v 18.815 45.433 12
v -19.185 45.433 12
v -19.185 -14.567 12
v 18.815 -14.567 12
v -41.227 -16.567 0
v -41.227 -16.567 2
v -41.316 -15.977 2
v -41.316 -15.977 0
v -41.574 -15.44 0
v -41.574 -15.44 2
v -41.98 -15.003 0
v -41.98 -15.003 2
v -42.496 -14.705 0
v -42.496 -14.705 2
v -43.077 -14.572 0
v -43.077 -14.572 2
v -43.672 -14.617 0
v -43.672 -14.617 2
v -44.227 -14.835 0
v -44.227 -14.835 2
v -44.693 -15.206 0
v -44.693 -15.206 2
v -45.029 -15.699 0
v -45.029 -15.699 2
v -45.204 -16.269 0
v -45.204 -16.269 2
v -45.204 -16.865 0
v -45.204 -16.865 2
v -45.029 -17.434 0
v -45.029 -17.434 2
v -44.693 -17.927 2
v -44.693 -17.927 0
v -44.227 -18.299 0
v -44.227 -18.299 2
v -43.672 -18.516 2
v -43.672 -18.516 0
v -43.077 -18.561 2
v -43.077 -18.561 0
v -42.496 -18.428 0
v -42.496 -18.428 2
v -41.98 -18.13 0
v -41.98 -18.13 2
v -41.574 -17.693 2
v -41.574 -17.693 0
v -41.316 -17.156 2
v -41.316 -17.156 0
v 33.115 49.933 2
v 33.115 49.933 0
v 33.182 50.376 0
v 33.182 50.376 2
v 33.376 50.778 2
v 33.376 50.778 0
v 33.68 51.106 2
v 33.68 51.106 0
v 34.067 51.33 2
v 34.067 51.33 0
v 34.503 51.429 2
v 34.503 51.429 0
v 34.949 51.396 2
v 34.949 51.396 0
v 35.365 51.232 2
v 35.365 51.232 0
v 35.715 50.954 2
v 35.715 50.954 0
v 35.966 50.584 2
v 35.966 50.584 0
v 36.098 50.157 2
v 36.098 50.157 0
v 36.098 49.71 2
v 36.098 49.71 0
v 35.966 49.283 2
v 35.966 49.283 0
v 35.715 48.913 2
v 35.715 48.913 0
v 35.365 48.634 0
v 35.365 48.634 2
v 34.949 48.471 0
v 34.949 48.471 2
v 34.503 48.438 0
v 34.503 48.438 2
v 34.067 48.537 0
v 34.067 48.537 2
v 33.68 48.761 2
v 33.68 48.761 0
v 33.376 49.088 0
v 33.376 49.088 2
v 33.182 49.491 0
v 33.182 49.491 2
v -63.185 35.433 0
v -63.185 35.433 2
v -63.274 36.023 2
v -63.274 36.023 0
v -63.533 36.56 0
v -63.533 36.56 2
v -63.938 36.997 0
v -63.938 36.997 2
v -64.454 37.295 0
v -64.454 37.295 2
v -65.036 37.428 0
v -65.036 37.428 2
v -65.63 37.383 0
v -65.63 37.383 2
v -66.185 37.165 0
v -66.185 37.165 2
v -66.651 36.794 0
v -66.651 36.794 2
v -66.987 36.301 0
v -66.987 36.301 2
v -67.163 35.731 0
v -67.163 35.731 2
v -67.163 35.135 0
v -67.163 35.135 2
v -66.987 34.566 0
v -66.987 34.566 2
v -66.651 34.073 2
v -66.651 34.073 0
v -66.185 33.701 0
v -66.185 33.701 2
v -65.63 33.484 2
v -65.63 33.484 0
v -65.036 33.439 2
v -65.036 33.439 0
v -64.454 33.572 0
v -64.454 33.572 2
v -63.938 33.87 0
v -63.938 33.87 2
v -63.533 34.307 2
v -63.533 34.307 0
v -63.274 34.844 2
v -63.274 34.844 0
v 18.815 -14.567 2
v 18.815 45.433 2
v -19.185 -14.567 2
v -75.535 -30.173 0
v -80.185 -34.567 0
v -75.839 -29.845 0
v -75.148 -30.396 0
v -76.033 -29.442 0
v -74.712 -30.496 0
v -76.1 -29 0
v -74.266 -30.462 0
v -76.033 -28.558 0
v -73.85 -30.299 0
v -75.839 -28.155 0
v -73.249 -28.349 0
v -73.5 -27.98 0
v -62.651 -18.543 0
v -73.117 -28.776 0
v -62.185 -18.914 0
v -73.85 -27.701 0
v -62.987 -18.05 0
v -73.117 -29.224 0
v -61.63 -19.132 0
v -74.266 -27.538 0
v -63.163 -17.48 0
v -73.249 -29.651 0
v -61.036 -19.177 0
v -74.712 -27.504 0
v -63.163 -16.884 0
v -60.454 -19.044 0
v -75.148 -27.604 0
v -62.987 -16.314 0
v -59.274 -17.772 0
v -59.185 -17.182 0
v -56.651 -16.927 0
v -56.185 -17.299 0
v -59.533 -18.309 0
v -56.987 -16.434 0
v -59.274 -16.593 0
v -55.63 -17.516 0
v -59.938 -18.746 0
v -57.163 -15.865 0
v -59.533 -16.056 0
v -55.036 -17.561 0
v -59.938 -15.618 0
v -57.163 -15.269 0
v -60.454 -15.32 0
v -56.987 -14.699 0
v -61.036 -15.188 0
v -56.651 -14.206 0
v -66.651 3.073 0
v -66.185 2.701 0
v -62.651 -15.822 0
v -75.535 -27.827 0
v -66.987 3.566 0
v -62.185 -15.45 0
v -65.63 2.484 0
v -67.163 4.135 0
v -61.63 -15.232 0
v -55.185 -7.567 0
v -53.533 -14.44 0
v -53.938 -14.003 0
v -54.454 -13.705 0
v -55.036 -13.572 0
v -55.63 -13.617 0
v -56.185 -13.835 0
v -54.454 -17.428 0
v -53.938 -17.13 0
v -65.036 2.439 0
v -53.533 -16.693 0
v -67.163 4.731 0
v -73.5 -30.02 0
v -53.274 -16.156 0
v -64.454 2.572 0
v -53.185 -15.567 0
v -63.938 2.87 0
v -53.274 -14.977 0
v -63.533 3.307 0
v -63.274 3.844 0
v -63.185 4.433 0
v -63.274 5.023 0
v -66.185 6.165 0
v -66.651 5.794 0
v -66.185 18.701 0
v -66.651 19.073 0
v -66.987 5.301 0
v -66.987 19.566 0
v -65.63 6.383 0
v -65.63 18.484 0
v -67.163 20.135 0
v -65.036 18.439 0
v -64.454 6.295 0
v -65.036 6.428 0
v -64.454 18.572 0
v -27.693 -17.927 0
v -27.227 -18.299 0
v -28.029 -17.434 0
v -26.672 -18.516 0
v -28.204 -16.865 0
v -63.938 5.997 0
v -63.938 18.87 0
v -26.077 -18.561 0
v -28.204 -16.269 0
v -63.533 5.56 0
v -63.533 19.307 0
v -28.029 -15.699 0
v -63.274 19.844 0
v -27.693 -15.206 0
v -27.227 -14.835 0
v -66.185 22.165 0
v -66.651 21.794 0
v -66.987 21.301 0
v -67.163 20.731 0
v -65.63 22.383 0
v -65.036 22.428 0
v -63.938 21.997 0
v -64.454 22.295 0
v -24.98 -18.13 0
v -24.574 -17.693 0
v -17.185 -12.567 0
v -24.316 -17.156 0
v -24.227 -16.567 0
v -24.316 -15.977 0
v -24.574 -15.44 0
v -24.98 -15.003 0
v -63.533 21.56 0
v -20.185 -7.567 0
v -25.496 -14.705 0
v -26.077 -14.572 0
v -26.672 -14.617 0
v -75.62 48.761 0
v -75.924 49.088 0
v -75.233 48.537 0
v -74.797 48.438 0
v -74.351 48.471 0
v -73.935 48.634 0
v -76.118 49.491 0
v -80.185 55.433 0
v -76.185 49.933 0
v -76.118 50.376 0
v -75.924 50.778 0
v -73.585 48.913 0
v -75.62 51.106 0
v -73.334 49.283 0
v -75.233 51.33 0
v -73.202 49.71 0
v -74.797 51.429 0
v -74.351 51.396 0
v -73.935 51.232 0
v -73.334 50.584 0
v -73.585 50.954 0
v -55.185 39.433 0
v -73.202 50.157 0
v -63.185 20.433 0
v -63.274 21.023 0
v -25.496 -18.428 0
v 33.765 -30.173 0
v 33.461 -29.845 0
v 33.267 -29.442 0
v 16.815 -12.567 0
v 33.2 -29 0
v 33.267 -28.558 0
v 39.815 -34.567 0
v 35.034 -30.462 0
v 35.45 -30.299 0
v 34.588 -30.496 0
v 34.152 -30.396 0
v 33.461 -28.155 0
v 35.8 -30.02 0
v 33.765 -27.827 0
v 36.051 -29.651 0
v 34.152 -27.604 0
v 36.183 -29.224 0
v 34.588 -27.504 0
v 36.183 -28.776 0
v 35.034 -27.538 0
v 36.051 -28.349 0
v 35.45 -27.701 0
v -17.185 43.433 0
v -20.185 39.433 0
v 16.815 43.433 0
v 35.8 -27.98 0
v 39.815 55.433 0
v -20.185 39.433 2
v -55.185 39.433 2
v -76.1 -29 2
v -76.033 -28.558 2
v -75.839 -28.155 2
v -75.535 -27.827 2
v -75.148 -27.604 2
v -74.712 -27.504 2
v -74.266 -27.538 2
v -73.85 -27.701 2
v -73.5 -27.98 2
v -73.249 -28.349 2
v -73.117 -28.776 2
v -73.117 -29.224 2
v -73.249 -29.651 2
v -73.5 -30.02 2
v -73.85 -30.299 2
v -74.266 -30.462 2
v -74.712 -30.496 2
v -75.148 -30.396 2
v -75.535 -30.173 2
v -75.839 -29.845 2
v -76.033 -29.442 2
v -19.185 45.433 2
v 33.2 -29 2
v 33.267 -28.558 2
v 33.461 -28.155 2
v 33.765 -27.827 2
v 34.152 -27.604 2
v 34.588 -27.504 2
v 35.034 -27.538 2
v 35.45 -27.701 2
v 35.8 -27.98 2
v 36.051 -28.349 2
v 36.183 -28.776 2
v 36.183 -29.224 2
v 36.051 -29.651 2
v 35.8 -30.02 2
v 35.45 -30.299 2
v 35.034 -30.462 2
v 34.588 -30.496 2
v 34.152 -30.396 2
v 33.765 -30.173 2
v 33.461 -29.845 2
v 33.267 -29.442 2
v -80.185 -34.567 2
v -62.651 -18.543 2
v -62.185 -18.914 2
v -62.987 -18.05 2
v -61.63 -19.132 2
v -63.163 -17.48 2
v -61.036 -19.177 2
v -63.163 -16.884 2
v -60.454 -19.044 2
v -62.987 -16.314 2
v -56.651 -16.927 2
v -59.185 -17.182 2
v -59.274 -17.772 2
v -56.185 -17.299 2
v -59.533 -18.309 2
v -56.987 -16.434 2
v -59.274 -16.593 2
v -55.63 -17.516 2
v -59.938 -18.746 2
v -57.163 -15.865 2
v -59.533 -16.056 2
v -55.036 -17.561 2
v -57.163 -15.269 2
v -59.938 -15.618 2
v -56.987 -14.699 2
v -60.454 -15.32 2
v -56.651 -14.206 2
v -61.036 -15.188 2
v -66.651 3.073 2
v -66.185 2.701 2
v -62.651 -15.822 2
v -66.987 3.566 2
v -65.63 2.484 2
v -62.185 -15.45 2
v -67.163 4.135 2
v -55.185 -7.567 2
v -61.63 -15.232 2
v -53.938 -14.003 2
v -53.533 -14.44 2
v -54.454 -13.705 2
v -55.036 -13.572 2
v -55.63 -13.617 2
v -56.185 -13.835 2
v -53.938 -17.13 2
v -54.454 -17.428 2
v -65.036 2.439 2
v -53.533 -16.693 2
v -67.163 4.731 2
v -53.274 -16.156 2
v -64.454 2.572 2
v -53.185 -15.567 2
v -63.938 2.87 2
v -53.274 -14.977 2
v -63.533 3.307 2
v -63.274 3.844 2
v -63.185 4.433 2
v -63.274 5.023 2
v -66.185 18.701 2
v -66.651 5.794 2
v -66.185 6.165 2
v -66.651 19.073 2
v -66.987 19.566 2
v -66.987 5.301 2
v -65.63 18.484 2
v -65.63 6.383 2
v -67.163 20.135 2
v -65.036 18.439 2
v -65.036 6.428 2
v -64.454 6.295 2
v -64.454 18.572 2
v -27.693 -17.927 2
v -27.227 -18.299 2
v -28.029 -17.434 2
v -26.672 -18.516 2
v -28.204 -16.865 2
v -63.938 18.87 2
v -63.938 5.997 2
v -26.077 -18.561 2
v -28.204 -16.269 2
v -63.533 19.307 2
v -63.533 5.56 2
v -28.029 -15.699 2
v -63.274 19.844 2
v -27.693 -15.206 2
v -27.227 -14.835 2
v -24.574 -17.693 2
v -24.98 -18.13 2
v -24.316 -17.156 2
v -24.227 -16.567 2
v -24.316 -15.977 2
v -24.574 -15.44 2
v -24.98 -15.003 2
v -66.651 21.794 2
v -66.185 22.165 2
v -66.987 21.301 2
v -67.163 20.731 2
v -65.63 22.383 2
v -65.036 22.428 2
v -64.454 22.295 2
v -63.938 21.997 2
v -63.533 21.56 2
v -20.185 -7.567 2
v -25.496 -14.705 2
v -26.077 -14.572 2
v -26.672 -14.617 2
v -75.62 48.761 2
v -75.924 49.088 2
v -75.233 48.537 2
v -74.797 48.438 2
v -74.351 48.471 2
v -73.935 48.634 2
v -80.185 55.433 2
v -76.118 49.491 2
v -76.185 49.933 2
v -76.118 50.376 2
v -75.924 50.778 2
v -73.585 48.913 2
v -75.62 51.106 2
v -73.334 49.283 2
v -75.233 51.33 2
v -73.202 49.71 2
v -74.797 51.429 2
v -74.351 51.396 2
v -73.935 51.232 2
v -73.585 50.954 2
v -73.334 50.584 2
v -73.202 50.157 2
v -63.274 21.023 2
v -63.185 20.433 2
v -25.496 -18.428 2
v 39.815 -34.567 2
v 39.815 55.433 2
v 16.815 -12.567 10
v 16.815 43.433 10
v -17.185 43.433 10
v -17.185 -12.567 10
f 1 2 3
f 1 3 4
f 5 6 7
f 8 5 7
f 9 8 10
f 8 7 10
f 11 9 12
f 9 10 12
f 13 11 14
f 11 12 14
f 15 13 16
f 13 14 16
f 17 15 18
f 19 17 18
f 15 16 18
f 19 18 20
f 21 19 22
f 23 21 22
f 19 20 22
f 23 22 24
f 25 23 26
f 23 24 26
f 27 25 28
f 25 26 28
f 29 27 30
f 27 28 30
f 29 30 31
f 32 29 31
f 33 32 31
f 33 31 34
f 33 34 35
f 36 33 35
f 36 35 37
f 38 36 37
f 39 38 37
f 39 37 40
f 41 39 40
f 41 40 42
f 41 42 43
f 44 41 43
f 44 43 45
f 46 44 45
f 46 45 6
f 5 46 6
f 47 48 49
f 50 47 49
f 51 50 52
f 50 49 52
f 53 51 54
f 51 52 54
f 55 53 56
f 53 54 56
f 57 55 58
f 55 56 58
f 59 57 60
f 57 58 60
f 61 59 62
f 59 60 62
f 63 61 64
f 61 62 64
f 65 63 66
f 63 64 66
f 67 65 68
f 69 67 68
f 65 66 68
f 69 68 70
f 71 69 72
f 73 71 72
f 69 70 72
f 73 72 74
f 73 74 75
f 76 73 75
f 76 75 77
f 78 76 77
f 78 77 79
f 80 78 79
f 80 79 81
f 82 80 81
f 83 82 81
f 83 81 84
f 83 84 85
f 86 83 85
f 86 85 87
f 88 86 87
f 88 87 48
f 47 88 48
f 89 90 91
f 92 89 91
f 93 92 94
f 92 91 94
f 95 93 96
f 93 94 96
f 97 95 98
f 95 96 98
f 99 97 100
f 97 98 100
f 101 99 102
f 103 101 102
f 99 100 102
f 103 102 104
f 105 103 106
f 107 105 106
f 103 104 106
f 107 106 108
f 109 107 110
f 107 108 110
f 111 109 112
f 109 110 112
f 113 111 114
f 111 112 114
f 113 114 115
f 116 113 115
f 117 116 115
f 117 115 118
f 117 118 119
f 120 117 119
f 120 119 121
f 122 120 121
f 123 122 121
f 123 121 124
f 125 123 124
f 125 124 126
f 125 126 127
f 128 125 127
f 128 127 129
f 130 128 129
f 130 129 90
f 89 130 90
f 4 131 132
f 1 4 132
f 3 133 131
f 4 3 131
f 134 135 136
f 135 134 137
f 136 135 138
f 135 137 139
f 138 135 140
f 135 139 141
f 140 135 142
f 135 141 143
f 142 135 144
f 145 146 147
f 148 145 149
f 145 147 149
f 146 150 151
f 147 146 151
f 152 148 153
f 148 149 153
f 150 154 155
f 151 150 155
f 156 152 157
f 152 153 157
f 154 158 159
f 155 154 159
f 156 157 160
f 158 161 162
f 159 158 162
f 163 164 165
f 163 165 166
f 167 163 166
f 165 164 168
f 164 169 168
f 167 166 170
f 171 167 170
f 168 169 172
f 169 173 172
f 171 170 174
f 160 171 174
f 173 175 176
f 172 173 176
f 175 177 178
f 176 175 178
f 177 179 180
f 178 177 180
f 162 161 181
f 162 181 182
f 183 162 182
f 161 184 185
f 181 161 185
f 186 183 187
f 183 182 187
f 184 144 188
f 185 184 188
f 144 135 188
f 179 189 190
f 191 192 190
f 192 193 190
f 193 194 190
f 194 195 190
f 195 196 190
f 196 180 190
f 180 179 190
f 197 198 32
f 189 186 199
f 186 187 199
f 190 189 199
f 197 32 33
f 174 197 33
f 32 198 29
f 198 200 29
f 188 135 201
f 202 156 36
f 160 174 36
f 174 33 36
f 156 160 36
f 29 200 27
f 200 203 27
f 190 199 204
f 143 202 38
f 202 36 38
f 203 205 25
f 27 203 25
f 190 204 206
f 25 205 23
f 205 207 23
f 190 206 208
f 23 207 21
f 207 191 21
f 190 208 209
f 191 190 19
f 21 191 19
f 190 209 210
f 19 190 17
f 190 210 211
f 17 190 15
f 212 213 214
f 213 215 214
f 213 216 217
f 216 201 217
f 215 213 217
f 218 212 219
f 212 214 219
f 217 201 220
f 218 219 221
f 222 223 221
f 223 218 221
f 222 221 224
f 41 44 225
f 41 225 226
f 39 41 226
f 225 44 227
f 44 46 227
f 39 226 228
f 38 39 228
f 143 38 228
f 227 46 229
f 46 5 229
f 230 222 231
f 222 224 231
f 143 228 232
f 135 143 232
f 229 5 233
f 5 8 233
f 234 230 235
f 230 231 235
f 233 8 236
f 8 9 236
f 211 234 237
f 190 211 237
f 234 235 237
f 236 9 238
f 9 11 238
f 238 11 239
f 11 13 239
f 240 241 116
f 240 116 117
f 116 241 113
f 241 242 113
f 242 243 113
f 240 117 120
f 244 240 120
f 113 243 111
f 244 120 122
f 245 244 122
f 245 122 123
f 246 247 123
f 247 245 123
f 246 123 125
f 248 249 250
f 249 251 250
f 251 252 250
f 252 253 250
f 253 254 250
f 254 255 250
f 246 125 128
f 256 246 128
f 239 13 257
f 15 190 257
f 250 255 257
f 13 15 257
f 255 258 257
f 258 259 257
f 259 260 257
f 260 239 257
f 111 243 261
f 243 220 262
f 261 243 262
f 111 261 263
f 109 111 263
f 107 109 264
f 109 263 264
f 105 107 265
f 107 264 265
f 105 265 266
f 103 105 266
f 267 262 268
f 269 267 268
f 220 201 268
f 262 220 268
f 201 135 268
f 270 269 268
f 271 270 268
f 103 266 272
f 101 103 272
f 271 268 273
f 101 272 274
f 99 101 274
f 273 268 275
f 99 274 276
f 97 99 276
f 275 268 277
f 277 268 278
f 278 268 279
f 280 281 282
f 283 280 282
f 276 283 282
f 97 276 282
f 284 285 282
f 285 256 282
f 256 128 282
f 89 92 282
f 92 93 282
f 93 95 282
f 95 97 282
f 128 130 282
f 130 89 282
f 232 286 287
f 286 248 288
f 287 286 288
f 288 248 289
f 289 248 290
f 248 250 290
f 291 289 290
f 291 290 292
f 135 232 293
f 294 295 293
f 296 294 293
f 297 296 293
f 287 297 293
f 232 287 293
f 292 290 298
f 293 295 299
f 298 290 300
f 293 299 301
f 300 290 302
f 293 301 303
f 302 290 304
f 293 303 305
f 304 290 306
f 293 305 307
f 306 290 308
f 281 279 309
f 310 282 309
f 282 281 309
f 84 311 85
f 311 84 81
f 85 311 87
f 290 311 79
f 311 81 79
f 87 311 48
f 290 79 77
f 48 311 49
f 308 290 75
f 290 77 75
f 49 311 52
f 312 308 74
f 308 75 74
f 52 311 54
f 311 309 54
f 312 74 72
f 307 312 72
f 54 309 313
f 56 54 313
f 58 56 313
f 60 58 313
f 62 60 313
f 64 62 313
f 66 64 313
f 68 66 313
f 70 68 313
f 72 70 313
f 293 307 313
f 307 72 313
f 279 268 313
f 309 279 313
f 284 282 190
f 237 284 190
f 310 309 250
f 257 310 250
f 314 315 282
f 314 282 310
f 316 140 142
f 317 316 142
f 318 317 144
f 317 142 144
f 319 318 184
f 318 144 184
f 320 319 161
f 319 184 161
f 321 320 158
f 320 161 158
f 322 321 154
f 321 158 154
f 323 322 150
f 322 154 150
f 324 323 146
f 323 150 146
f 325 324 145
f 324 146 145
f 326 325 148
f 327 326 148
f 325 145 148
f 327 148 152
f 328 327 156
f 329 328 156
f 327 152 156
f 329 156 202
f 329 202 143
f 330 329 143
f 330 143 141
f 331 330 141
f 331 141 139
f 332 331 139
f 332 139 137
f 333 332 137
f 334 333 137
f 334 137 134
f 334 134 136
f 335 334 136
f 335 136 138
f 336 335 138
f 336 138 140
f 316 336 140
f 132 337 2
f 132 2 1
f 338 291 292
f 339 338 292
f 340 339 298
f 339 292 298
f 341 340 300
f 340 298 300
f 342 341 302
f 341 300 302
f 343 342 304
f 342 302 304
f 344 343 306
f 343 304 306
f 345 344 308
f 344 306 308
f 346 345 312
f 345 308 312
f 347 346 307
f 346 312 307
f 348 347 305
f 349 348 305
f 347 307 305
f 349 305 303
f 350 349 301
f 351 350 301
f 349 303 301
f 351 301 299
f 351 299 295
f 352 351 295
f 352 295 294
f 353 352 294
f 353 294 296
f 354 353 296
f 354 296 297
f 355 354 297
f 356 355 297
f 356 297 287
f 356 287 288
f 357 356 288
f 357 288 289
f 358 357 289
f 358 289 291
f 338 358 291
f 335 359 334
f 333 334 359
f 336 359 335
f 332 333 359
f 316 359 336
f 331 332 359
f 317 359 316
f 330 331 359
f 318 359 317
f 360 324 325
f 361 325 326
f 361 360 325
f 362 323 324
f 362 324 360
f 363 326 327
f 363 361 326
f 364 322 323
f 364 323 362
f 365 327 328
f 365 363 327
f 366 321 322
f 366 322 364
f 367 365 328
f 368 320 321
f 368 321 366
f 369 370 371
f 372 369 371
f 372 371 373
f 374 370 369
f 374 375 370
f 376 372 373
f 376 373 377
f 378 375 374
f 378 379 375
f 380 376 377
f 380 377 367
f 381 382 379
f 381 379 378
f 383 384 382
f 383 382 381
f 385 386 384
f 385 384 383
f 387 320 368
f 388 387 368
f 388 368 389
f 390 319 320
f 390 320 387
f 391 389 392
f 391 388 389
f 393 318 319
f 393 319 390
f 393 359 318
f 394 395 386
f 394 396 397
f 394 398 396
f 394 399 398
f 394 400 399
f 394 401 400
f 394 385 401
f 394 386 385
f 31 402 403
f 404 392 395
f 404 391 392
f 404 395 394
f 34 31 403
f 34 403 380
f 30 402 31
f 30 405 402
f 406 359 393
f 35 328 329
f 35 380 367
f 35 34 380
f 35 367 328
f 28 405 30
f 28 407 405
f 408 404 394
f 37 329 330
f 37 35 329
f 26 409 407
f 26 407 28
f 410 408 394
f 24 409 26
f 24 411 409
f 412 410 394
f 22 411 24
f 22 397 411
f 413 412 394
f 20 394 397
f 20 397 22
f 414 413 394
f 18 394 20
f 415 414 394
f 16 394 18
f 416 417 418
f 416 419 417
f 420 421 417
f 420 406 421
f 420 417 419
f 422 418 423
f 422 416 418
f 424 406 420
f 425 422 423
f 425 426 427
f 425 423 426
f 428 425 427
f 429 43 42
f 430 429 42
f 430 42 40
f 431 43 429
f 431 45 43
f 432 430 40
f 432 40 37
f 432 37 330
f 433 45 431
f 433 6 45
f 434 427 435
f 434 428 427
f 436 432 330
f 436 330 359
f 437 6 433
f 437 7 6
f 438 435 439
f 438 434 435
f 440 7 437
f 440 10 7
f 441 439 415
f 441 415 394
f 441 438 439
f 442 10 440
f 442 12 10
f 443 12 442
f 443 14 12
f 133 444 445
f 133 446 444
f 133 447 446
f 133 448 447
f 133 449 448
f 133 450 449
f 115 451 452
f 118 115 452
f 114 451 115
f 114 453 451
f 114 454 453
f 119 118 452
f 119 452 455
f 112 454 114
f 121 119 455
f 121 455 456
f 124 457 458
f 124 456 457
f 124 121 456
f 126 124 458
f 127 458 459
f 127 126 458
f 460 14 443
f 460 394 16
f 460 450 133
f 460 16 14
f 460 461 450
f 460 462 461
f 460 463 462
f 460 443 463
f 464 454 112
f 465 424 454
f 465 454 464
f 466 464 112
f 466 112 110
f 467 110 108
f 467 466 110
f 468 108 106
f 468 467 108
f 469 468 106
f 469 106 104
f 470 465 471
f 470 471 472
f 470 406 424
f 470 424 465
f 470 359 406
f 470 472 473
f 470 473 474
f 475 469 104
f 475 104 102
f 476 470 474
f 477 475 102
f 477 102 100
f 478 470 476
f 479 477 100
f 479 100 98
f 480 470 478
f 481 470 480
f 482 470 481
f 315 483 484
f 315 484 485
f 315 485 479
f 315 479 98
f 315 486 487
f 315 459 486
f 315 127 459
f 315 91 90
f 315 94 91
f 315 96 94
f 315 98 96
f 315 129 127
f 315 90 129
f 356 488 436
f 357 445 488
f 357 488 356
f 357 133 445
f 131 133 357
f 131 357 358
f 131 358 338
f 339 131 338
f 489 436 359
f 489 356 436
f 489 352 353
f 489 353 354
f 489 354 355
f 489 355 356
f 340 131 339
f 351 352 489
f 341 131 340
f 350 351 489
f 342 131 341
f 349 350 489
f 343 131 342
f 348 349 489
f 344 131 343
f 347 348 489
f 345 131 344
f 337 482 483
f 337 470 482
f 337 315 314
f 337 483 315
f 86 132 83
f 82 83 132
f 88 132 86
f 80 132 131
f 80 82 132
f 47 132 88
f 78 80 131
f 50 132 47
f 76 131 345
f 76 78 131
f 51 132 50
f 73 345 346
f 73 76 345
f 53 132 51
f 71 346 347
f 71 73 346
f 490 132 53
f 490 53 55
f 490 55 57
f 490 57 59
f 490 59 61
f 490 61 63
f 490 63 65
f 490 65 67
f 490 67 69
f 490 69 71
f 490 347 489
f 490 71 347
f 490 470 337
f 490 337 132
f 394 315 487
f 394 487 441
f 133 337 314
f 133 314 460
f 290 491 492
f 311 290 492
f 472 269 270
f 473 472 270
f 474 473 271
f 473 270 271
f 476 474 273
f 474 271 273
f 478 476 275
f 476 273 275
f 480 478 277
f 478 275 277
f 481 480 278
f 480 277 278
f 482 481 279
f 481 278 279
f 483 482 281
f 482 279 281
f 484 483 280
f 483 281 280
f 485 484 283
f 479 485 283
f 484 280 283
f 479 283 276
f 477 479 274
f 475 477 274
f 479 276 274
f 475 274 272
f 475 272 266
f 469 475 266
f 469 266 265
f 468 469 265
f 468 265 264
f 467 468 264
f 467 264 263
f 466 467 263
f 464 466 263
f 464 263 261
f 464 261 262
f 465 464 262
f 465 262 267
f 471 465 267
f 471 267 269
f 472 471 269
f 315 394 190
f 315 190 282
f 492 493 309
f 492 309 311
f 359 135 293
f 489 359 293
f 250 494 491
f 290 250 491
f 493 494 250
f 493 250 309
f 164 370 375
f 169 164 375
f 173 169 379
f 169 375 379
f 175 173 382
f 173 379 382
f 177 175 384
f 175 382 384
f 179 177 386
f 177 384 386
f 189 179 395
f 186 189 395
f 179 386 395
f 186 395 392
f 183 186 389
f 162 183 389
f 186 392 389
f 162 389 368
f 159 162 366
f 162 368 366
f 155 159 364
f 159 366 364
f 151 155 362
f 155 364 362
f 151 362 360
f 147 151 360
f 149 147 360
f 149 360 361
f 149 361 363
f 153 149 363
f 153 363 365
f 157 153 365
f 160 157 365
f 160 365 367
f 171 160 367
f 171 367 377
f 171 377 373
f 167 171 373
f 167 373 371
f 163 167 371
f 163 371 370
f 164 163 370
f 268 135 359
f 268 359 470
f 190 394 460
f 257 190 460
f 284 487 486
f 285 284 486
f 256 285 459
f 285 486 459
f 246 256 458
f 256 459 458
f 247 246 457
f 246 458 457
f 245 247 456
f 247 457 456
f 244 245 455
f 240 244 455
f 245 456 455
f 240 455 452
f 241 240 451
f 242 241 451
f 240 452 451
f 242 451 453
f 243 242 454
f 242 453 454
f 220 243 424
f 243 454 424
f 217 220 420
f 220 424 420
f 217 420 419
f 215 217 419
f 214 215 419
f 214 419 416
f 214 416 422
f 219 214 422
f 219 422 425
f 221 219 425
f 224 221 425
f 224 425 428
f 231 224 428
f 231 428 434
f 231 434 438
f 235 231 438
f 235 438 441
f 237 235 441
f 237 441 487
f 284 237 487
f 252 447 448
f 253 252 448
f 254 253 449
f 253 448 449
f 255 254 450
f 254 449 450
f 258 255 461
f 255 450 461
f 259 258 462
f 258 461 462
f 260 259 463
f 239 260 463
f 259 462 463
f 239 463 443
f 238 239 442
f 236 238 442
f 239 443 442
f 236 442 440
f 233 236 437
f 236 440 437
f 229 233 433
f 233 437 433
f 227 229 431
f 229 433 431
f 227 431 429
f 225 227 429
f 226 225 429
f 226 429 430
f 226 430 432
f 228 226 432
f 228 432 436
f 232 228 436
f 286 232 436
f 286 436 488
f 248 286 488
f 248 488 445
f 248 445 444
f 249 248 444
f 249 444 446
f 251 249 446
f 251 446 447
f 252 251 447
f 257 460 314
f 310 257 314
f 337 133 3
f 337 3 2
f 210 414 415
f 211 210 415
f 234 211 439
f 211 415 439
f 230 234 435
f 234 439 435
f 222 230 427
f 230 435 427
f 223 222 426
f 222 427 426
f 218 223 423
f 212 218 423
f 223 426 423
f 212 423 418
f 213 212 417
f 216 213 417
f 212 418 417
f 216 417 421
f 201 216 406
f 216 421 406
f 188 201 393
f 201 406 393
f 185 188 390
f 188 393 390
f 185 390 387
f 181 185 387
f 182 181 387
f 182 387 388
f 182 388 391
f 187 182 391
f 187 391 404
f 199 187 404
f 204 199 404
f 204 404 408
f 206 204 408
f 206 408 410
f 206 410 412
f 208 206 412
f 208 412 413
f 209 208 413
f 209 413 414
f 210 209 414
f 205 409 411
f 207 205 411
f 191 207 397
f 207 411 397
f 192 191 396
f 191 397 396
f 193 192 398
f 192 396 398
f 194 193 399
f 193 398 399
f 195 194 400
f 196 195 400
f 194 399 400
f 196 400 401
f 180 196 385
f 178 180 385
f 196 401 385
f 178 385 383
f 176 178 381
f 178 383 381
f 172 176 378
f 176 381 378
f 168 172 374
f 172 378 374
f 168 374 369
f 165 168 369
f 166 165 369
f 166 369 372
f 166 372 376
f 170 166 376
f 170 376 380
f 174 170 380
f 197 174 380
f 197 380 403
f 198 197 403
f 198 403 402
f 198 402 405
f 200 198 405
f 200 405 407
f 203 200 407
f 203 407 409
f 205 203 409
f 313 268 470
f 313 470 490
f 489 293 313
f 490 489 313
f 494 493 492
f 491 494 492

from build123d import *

# Parameters (mm, degrees)
F0_W      = 120
F0_H      = 90
F1_DEPTH  = 2
F2_W      = 35
F2_H      = 47
F3_DEPTH  = 2
F5_D      = 3
F6_W      = 38
F6_H      = 60
F6_W_2    = 34
F6_H_2    = 56
F7_DEPTH  = 10
F8_W      = 34
F8_H      = 56
F9_DEPTH  = 12.001
F10_W     = 34
F10_H     = 56
F11_DEPTH = 2
F12_R     = 2
F13_DEPTH = 25


with BuildPart() as f1:
    # F0 (on Top) → F1 (new body)
    with BuildSketch(Plane.XY):
        with Locations((-20.18502, 10.433374)):
            Rectangle(F0_W, F0_H)
    extrude(amount=F1_DEPTH)

    # F2 (on face) → F3 (cut)
    with BuildSketch(Plane.XY.offset(2)):
        with Locations((-37.68502, 15.933374)):
            Rectangle(F2_W, F2_H)
    extrude(amount=-F3_DEPTH, mode=Mode.SUBTRACT)

    # F5 (through all)
    with Locations(Plane.XY.offset(2)):
        with Locations((-74.6, -29), (34.7, -29), (34.61498, 49.933374), (-74.68502, 49.933374)):
            Hole(F5_D / 2)

    # F6 (on face) → F7 (join)
    with BuildSketch(Plane.XY.offset(2)):
        with Locations((-0.18502, 15.433374)):
            Rectangle(F6_W, F6_H)
        with Locations((-0.18502, 15.433374)):
            Rectangle(F6_W_2, F6_H_2, mode=Mode.SUBTRACT)
        with Locations((-0.18502, 15.433374)):
            Rectangle(F6_W_2, F6_H_2)
    extrude(amount=F7_DEPTH)

    # F8 (on face) → F9 (cut, through all)
    with BuildSketch(Plane.XY.offset(12)):
        with Locations((-0.18502, 15.433374)):
            Rectangle(F8_W, F8_H)
    extrude(amount=-F9_DEPTH, mode=Mode.SUBTRACT)

    # F10 (on face) → F11 (join)
    with BuildSketch(Plane.XY.offset(12)):
        with Locations((-0.18502, 15.433374)):
            Rectangle(F10_W, F10_H)
    extrude(amount=-F11_DEPTH)

    # F12 (on face) → F13 (cut)
    with BuildSketch(Plane.XY.offset(2)):
        with Locations((-65.18502, 35.433374)):
            Circle(F12_R)
        with Locations((-65.18502, 20.433374)):
            Circle(F12_R)
        with Locations((-65.18502, 4.433374)):
            Circle(F12_R)
        with Locations((-61.18502, -17.182156)):
            Circle(F12_R)
        with Locations((-55.18502, -15.566626)):
            Circle(F12_R)
        with Locations((-43.226759, -16.566626)):
            Circle(F12_R)
        with Locations((-26.226759, -16.566626)):
            Circle(F12_R)
    extrude(amount=-F13_DEPTH, mode=Mode.SUBTRACT)


solid = f1.part
